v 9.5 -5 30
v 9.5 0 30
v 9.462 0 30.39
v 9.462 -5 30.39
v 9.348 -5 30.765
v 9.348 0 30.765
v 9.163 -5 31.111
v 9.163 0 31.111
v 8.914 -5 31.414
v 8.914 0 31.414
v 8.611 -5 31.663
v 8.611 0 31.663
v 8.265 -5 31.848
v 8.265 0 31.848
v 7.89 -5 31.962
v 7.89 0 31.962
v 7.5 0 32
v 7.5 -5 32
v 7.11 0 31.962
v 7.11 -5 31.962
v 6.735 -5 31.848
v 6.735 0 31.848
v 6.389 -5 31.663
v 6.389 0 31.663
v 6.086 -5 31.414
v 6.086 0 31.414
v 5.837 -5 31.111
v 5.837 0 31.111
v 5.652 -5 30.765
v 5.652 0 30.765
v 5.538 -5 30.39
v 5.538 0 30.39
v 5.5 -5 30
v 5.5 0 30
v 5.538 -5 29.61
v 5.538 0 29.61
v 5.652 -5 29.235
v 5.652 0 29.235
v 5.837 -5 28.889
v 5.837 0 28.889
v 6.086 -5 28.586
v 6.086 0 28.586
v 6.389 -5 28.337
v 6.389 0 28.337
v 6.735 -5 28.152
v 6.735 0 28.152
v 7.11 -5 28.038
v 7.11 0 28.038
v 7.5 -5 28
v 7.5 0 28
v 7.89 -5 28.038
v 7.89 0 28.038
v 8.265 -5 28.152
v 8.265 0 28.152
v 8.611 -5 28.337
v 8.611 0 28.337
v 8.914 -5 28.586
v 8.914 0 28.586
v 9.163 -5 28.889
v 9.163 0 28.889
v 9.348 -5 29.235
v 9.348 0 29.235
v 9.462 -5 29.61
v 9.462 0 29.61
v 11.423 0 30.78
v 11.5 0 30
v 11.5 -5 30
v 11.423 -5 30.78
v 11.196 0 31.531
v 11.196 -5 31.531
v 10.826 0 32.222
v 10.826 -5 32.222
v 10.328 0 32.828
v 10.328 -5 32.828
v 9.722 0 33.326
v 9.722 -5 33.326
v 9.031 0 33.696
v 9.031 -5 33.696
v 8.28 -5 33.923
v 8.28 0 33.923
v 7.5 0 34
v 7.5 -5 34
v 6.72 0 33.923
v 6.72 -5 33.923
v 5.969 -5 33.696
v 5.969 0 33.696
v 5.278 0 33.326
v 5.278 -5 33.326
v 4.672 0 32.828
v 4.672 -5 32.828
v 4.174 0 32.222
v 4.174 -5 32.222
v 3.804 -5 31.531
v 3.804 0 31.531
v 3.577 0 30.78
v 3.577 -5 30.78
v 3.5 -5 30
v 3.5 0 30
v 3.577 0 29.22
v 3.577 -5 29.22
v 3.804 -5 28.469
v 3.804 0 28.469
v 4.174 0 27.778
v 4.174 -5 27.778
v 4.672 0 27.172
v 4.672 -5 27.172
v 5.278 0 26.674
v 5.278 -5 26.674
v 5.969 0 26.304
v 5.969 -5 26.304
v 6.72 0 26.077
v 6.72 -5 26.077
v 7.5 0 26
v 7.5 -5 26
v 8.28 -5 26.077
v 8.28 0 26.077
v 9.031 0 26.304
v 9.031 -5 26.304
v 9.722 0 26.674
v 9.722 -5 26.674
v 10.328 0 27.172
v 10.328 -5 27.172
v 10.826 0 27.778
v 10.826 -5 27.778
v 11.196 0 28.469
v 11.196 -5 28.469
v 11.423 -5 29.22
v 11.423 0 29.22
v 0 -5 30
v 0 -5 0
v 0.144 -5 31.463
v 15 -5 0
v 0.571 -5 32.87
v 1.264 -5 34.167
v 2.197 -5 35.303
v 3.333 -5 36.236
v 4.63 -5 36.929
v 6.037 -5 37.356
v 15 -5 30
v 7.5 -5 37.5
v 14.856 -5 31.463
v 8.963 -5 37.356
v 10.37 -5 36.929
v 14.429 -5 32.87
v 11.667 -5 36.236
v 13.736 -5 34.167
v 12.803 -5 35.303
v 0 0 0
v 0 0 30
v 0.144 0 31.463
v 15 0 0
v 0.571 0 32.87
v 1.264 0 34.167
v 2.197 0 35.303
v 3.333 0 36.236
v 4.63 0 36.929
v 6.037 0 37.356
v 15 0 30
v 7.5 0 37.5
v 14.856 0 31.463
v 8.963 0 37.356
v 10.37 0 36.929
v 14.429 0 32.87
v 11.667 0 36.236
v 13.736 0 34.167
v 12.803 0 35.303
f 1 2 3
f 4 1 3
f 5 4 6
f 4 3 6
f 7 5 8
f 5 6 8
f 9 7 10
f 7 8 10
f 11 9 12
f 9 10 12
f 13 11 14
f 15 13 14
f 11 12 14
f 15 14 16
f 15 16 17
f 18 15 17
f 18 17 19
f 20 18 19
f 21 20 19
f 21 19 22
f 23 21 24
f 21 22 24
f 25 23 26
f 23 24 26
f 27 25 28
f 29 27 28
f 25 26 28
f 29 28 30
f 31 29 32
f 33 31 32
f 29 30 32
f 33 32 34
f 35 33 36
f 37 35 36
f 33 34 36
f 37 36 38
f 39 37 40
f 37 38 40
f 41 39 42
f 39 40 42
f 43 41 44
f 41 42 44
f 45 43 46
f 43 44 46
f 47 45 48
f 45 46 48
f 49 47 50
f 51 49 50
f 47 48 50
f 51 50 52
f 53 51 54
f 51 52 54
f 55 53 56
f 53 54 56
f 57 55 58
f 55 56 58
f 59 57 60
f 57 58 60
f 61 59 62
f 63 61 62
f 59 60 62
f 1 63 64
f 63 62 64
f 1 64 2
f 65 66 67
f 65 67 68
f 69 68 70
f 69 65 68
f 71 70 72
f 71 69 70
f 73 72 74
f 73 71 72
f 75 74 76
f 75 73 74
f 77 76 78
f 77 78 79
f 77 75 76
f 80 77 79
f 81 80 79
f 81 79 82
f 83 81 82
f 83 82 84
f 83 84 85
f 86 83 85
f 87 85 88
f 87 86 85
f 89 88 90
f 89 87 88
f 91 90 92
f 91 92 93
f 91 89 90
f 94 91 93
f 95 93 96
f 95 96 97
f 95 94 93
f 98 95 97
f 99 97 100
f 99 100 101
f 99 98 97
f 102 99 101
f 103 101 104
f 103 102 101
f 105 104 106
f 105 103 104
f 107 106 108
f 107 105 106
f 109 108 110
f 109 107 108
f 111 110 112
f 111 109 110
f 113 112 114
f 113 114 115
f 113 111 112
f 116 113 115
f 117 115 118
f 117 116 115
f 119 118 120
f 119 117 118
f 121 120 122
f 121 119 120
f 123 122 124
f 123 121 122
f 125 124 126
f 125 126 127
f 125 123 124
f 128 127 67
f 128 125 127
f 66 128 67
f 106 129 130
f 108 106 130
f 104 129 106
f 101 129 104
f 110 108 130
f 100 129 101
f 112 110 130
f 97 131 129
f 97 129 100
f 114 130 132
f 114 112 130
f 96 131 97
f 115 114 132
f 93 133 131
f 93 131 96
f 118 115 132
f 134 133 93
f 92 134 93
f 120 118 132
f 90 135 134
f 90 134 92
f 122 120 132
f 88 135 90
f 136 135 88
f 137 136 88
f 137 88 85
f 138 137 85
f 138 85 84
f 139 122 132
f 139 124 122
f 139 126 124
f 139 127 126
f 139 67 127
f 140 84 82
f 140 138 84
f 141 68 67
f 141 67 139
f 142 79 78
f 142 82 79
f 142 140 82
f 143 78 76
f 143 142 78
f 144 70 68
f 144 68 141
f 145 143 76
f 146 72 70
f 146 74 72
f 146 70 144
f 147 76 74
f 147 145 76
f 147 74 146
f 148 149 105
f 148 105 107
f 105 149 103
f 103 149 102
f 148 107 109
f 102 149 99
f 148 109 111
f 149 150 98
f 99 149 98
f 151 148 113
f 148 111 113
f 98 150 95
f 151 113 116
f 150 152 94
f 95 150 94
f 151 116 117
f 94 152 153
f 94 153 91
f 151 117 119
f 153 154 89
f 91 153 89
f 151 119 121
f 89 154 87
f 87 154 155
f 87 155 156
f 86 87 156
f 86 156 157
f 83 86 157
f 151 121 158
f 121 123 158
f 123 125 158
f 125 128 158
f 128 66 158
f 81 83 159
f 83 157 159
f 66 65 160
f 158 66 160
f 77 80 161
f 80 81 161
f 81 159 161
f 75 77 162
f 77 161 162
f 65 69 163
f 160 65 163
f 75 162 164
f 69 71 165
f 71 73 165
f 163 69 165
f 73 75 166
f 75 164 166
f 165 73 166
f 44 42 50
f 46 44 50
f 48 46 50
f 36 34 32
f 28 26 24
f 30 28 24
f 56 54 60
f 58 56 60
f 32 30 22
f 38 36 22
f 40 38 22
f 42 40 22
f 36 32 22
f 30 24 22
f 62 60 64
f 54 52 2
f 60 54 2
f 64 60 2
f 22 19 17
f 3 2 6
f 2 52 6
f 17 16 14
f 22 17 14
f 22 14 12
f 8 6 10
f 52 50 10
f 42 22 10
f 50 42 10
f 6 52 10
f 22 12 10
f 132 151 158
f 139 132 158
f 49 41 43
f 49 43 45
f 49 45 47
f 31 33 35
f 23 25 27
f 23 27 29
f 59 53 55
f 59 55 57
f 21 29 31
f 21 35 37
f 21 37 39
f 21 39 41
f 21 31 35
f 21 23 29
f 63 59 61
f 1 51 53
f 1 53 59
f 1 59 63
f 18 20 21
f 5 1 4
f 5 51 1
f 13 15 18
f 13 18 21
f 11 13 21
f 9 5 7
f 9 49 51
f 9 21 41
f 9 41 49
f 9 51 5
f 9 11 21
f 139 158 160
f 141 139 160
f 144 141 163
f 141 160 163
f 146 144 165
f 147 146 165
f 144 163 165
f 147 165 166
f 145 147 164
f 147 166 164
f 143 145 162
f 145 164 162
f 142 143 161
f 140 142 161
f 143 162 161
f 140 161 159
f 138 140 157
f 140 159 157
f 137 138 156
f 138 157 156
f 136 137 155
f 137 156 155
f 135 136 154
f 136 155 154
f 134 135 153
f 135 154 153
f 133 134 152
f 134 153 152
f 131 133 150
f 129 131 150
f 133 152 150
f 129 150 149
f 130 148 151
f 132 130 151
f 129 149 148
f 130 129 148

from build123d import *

# Parameters (mm, degrees)
F0_R     = 4
F0_R_2   = 2
F1_DEPTH = 5


with BuildPart() as f1:
    # F0 (on Front) → F1 (new body)
    with BuildSketch(Plane.XZ):
        with BuildLine():
            Line((0, 30), (0, 0))
            Line((0, 0), (15, 0))
            Line((15, 0), (15, 30))
            ThreePointArc((15, 30), (7.5, 37.5), (0, 30))
        make_face()
        with Locations((7.5, 30)):
            Circle(F0_R, mode=Mode.SUBTRACT)
        with Locations((7.5, 30)):
            Circle(F0_R_2)
    extrude(amount=F1_DEPTH)


solid = f1.part
